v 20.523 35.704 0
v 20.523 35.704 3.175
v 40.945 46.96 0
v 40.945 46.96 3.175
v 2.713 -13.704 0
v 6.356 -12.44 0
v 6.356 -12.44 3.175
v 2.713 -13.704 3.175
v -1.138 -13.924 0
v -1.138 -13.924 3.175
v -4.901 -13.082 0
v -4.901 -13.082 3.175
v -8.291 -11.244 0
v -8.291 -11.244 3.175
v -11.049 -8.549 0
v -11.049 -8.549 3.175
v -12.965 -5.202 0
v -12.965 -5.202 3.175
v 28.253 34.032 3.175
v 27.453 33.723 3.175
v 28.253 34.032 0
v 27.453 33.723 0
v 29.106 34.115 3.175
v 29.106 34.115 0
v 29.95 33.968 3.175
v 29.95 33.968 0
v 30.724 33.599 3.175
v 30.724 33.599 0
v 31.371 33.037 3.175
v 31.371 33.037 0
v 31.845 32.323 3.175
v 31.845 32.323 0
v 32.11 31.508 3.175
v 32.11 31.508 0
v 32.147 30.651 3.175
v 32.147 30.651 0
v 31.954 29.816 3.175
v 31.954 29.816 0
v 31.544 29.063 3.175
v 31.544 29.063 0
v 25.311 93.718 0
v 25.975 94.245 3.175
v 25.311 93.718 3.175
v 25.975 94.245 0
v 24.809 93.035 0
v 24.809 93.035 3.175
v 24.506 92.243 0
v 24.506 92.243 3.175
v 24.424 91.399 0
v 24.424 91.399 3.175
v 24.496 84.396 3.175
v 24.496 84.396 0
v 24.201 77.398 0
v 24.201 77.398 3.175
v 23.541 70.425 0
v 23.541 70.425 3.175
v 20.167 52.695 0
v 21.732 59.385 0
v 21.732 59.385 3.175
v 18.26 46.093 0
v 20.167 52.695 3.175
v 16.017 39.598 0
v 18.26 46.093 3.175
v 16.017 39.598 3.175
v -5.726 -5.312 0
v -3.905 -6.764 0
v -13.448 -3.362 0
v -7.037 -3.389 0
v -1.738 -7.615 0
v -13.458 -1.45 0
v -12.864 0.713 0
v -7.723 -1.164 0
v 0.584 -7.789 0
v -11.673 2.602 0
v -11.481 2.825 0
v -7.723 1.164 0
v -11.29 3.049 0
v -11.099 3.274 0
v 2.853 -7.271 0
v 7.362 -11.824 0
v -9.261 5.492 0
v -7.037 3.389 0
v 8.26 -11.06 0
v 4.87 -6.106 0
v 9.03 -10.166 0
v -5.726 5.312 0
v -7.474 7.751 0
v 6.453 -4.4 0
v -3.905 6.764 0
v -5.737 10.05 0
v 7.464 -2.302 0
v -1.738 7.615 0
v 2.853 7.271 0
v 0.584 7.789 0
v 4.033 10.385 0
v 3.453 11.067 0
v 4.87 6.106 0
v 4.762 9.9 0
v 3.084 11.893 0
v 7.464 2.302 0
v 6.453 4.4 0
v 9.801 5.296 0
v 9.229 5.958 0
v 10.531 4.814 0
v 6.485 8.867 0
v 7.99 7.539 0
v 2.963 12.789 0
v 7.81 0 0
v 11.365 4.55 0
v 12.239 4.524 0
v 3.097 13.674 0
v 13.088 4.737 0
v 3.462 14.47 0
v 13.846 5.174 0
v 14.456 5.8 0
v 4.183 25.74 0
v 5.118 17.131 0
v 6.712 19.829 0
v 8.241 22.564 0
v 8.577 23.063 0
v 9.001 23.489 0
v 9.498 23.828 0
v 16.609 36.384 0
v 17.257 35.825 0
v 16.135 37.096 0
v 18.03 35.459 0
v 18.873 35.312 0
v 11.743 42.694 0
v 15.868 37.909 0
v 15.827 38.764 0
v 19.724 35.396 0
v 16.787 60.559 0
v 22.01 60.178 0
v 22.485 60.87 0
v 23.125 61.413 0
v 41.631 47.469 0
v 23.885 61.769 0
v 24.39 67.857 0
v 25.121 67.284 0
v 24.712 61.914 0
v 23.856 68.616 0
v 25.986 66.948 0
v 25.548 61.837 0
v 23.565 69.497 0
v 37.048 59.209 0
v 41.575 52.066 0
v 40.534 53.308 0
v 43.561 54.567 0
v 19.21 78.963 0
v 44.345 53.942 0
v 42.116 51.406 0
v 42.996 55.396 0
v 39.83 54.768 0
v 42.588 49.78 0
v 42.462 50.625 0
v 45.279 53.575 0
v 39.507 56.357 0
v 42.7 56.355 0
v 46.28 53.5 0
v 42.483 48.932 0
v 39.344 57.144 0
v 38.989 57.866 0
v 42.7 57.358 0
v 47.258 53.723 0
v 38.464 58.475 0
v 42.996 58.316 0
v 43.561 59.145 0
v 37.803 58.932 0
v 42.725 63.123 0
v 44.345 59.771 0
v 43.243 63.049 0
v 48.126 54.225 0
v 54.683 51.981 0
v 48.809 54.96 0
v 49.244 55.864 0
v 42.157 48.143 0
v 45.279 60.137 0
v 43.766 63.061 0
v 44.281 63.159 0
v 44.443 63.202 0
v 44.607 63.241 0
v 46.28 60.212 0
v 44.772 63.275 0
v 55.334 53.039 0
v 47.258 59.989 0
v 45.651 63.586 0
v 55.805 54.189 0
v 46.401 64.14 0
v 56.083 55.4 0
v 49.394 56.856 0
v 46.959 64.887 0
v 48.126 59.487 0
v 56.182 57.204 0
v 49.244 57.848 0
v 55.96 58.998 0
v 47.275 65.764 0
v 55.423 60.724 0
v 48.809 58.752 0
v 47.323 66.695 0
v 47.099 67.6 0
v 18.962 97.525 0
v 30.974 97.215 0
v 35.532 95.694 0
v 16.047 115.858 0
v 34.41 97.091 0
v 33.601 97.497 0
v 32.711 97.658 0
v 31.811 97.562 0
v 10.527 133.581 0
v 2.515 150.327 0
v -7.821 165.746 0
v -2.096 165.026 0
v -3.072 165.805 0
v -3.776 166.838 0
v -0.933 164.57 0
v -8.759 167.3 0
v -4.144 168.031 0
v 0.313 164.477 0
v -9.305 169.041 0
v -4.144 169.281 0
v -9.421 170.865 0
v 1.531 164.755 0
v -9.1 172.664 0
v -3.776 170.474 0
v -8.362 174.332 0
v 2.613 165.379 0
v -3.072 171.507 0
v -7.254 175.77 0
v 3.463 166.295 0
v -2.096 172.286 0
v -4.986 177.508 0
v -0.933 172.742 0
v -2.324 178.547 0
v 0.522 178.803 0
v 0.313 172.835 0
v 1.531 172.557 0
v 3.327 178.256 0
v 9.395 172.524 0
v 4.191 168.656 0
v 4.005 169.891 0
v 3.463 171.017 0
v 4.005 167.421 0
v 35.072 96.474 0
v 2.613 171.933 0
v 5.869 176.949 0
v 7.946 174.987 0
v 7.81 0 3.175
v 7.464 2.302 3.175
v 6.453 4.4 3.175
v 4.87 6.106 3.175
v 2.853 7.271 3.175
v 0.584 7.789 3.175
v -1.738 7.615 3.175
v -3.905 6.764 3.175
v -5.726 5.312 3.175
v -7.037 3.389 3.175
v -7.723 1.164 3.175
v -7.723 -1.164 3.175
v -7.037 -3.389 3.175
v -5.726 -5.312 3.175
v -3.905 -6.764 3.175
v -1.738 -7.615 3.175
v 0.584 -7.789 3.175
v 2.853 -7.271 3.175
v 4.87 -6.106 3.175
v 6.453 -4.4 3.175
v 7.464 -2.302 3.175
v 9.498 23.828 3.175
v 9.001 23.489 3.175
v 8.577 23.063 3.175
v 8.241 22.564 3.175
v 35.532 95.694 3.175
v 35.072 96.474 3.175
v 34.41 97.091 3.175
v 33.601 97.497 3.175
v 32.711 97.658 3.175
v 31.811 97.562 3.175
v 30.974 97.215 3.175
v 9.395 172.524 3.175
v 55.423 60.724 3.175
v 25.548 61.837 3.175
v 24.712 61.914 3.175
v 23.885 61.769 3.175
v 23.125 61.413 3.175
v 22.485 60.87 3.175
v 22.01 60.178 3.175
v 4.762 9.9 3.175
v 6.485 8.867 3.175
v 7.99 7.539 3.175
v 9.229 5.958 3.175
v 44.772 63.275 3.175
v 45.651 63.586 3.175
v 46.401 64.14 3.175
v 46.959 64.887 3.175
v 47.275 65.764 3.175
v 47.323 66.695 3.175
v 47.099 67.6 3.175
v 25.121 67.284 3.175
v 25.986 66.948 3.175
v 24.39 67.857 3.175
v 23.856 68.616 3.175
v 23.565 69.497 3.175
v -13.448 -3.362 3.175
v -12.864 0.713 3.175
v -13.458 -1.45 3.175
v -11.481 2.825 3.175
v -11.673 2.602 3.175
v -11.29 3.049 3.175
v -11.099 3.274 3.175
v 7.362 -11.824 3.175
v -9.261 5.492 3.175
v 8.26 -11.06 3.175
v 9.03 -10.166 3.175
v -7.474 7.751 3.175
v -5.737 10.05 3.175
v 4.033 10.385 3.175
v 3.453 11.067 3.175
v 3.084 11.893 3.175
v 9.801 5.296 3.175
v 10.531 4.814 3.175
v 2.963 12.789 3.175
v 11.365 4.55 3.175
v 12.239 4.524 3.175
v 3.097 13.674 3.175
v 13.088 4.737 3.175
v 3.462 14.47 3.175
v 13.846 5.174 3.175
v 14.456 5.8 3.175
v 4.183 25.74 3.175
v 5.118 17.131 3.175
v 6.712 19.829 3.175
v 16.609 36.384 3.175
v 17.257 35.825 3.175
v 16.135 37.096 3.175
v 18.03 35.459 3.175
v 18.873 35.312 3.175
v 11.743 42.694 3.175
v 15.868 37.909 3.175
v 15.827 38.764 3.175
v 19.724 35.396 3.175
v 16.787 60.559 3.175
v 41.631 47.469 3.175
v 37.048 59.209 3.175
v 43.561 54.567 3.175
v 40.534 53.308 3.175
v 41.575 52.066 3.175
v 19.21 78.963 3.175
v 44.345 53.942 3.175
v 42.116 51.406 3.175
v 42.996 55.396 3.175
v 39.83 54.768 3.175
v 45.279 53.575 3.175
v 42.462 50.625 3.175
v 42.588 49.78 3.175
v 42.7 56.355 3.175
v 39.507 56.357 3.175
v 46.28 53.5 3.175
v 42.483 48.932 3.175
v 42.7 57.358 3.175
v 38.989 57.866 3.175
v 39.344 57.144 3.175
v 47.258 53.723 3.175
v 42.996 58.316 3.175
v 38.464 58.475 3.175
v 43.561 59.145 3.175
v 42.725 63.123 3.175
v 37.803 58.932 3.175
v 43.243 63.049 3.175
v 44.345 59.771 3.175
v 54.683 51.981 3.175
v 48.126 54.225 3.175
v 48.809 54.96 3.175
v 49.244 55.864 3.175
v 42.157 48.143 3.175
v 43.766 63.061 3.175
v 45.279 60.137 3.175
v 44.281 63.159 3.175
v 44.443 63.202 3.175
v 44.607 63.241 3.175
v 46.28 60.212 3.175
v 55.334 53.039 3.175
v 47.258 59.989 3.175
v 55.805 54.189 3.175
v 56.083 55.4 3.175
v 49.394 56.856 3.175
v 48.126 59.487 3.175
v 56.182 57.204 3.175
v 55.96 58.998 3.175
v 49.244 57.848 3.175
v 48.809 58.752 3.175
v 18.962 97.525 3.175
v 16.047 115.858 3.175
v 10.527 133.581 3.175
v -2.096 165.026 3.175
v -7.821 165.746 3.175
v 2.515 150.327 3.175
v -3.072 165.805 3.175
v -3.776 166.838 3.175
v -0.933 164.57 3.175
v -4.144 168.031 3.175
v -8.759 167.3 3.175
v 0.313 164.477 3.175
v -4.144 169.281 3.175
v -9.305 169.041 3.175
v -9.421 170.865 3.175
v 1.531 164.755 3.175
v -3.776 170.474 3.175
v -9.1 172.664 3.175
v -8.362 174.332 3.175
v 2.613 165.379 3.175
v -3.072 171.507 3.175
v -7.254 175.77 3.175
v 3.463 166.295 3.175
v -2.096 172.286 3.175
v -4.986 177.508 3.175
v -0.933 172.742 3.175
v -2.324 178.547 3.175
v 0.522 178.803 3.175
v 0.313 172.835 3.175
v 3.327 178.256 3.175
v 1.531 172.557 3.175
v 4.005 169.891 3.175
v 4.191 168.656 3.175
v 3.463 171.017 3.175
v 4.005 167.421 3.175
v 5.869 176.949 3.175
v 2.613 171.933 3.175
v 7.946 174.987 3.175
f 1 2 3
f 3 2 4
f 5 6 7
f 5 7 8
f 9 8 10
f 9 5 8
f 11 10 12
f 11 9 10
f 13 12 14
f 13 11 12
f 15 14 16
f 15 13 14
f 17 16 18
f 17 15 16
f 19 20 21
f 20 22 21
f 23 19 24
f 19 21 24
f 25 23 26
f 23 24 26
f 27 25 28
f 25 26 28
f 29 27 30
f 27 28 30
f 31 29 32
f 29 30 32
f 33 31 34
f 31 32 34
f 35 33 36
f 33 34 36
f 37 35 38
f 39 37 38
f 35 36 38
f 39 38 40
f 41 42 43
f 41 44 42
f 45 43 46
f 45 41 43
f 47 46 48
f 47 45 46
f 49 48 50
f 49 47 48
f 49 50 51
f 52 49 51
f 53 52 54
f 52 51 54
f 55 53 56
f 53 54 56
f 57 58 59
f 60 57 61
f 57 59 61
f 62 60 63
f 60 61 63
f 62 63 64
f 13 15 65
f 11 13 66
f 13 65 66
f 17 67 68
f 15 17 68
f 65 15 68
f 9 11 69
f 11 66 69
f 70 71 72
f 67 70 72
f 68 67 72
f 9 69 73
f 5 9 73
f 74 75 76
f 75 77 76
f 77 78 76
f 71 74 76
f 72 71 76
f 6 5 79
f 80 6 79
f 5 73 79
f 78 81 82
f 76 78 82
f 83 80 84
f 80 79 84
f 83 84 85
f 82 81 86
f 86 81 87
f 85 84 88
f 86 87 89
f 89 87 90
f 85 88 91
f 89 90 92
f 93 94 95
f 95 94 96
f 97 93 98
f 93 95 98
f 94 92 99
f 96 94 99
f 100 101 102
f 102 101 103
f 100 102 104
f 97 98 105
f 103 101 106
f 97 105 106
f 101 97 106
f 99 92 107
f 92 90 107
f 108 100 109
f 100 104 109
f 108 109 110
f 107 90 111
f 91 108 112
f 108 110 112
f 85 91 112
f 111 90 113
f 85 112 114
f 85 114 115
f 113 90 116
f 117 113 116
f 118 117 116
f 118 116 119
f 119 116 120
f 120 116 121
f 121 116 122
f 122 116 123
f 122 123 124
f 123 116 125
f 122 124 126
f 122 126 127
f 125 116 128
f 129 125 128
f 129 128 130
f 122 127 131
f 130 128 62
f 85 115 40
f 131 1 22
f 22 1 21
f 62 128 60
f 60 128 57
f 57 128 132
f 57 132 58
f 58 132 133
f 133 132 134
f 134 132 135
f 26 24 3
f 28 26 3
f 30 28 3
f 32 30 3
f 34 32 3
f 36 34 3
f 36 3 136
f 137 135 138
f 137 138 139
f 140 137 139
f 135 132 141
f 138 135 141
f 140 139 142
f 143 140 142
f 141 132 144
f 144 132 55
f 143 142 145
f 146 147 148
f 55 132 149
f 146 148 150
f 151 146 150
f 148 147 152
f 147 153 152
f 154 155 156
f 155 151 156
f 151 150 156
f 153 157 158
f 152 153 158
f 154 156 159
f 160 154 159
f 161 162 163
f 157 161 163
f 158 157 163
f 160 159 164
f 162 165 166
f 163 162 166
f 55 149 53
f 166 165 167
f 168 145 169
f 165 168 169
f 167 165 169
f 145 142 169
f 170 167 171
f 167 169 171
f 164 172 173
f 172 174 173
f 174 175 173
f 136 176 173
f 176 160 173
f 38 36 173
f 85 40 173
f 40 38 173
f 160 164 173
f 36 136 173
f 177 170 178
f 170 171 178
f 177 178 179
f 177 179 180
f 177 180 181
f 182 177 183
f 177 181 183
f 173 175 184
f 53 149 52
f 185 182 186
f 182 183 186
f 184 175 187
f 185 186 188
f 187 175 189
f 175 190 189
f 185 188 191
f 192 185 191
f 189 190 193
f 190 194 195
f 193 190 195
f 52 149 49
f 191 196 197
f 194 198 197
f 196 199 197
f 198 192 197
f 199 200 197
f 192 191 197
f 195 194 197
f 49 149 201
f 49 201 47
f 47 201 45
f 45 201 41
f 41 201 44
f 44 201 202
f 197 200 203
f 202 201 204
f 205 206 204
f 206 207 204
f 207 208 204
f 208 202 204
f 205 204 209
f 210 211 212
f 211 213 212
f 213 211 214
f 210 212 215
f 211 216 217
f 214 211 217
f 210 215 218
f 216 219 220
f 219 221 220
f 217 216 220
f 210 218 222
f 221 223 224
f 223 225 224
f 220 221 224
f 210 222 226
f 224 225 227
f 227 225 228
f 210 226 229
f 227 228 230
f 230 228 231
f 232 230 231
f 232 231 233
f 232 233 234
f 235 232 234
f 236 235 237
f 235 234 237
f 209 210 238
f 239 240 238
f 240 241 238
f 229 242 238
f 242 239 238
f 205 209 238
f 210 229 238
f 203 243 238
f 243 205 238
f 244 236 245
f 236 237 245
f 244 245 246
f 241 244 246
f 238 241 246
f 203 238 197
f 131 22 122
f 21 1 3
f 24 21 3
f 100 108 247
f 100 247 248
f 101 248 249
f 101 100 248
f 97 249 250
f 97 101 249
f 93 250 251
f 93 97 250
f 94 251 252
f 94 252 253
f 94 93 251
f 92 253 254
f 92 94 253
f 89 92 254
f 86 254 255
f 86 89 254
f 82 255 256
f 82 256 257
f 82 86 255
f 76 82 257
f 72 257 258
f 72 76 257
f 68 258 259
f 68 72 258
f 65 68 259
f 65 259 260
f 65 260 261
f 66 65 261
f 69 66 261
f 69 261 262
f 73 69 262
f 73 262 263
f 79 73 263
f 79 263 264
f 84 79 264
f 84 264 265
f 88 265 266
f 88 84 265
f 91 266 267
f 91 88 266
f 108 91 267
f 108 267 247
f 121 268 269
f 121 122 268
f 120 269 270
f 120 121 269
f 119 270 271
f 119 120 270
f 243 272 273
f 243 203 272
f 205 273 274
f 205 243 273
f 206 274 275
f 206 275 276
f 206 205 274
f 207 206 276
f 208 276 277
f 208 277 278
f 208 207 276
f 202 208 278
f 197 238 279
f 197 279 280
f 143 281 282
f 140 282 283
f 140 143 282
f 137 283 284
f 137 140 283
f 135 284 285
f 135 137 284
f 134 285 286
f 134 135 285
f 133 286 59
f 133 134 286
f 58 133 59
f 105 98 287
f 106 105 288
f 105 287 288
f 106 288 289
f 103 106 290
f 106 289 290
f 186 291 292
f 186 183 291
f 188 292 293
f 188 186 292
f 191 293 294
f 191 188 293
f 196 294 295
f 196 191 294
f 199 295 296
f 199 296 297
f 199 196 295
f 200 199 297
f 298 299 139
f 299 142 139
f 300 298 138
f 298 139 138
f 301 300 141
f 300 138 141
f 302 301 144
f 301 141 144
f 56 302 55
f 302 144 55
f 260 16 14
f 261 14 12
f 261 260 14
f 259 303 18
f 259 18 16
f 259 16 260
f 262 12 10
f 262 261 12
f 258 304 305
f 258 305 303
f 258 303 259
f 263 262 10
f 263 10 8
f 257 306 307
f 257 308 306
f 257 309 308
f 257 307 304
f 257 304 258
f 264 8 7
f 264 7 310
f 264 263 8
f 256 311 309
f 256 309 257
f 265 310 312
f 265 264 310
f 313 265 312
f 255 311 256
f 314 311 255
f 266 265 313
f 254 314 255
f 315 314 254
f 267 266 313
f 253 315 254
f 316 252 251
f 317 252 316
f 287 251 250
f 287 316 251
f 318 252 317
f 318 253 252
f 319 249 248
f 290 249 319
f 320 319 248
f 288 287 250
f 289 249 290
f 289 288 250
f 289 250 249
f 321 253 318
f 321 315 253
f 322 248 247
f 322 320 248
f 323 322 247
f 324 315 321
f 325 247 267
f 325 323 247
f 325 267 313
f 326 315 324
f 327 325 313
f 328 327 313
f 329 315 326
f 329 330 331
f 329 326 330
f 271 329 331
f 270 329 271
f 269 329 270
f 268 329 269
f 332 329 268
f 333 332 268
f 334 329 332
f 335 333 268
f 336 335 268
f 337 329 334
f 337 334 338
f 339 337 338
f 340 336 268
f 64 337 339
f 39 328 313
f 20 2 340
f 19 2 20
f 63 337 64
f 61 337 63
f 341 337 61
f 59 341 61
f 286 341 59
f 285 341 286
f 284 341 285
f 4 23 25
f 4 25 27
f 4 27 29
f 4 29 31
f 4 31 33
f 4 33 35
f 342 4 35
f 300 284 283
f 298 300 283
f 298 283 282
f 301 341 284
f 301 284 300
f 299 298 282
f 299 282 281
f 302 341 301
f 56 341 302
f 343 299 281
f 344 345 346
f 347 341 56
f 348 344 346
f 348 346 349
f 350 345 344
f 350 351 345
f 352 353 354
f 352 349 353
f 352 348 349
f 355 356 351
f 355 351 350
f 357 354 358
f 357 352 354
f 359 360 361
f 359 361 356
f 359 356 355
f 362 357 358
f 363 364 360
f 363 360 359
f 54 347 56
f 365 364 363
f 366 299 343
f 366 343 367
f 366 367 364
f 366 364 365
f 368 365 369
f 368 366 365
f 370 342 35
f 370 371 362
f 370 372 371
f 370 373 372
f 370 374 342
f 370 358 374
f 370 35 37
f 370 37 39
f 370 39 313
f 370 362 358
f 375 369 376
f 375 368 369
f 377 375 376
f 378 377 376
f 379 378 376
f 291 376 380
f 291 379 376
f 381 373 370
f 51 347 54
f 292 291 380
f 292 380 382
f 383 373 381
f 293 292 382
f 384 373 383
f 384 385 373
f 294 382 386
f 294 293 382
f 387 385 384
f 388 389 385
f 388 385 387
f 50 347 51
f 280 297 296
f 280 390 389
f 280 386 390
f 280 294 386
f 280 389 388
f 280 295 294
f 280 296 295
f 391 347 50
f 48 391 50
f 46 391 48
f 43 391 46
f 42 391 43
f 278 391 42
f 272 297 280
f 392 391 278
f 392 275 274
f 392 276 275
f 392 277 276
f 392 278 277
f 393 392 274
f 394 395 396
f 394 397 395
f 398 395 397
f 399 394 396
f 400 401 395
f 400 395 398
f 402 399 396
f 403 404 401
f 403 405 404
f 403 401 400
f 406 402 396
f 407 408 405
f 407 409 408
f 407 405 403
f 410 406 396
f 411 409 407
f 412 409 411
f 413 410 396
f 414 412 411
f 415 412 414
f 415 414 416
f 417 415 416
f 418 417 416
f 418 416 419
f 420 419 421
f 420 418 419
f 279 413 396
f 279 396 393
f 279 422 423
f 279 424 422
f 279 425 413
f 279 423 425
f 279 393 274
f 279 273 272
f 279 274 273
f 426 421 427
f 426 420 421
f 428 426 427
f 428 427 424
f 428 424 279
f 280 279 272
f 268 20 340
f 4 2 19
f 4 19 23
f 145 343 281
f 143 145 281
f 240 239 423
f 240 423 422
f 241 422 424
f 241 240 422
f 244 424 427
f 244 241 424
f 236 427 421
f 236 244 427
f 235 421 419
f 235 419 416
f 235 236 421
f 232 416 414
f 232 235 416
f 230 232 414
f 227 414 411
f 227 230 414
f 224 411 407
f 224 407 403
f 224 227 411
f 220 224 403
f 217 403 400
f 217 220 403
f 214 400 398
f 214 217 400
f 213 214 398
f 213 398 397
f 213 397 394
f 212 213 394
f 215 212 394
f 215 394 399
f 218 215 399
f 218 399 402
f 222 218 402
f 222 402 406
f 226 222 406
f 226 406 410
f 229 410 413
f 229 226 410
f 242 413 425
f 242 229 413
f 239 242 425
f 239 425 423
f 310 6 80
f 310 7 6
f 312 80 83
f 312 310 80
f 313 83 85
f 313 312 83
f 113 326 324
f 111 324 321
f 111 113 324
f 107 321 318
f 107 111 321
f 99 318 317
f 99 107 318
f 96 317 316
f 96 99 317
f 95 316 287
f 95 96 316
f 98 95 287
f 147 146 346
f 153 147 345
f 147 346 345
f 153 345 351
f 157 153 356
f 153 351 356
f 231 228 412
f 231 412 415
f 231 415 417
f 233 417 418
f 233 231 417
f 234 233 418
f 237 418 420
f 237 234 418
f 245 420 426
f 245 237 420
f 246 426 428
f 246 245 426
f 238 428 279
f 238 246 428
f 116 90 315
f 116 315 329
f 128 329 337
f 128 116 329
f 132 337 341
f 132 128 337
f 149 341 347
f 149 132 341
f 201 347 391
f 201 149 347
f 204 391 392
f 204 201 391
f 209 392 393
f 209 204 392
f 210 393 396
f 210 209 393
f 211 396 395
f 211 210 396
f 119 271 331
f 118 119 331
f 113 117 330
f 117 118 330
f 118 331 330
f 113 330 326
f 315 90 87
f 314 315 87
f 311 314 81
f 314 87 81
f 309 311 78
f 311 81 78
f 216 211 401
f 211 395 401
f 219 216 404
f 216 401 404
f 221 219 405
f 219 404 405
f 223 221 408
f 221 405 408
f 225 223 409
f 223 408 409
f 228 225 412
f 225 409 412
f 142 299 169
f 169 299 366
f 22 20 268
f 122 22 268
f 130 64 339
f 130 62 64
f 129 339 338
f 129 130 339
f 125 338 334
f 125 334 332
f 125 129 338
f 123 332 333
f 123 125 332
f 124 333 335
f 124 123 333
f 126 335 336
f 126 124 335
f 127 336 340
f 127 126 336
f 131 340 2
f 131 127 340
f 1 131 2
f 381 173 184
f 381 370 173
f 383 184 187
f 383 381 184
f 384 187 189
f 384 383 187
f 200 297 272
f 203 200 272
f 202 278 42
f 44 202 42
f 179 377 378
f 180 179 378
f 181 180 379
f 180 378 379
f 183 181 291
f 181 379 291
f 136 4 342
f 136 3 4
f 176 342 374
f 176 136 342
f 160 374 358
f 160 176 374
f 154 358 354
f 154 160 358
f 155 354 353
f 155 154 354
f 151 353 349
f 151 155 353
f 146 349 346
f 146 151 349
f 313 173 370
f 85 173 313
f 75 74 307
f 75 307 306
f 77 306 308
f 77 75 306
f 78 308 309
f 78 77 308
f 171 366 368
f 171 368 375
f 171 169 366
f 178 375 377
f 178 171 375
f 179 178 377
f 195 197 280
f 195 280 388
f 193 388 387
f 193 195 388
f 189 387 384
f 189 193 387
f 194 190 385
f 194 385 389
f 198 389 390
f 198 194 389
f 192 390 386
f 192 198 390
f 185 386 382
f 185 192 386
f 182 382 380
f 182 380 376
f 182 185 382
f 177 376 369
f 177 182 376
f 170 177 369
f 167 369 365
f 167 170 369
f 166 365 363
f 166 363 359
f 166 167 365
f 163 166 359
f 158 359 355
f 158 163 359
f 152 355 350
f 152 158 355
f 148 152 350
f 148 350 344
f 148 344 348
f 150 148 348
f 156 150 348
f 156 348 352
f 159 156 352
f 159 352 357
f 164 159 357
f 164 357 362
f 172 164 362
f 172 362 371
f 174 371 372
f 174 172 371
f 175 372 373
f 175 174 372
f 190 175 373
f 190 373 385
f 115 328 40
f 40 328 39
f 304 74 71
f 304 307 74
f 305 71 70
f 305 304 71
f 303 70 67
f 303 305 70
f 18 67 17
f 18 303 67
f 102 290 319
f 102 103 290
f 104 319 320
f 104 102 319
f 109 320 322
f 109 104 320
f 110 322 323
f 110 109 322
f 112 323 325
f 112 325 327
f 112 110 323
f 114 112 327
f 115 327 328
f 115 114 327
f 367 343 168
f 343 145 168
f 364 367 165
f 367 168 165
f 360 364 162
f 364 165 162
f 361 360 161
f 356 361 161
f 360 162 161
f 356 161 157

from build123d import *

# Parameters (mm, degrees)
SKETCH1_R           = 3.3655
SKETCH1_R_2         = 4.191
SKETCH1_R_3         = 7.8105
BOSS_EXTRUDE1_DEPTH = 3.175
CUT_EXTRUDE1_DEPTH  = 6.35
FILLET5_R           = 7.62
FILLET6_R           = 3.175


with BuildPart() as part:
    # Sketch1 → Boss-Extrude1 (new body)
    with BuildSketch(Plane.XY):
        with BuildLine():
            ThreePointArc((-13.97, 0), (-6.360706327, -12.437938536), (8.177790267, -11.326281223))
            Line((8.177790267, -11.326281223), (55.423036695, 52.988309562))
            ThreePointArc((55.423036695, 52.988309562), (56.188096936, 56.856216867), (55.423036695, 60.724124173))
            Line((55.423036695, 60.724124173), (9.394939759, 172.523907306))
            ThreePointArc((9.394939759, 172.523907306), (-1.971422335, 178.622899918), (-10.16, 168.656))
            ThreePointArc((-10.16, 168.656), (19.399795867, 83.617198889), (-13.97, 0))
        make_face()
        with Locations((46.028096936, 56.856216867)):
            Circle(SKETCH1_R, mode=Mode.SUBTRACT)
        with Locations((0, 168.656)):
            Circle(SKETCH1_R_2, mode=Mode.SUBTRACT)
        Circle(SKETCH1_R_3, mode=Mode.SUBTRACT)
    extrude(amount=BOSS_EXTRUDE1_DEPTH)

    # Sketch2 → Cut-Extrude1 (cut)
    with BuildSketch(Plane.XY.offset(3.175)):
        with BuildLine():
            ThreePointArc((24.342369565, 93.274569778), (24.372628405, 80.404838249), (23.166725616, 67.591692511))
            Line((23.166725616, 67.591692511), (43.590488936, 62.925500803))
            ThreePointArc((43.590488936, 62.925500803), (46.410316451, 63.385539075), (49.157207608, 62.599631066))
            Line((49.157207608, 62.599631066), (34.133316244, 99.091858815))
            Line((34.133316244, 99.091858815), (24.342369565, 93.274569778))
        make_face()
        with BuildLine():
            Line((39.723792881, 58.598023584), (22.350976776, 62.56716919))
            ThreePointArc((22.350976776, 62.56716919), (18.436727595, 46.655838158), (12.607589722, 31.342022385))
            Line((12.607589722, 31.342022385), (47.239535948, 50.428888047))
            ThreePointArc((47.239535948, 50.428888047), (41.214780777, 52.427884471), (39.723792881, 58.598023584))
        make_face()
        with BuildLine():
            Line((40.079895195, 40.682524127), (8.679618073, 23.376743294))
            ThreePointArc((8.679618073, 23.376743294), (5.069193292, 17.049607217), (1.119884547, 10.928269252))
            ThreePointArc((1.119884547, 10.928269252), (7.805850235, 7.729806748), (10.938708503, 1.012850693))
            Line((10.938708503, 1.012850693), (40.079895195, 40.682524127))
        make_face()
    extrude(amount=-CUT_EXTRUDE1_DEPTH, mode=Mode.SUBTRACT)

    # Fillet5
    fillet5_edges = [part.edges().sort_by_distance(p)[0] for p in [
        (-13.97, 0, 1.5875),
        (-10.16, 168.656, 1.5875),
        (55.423036695, 52.988309562, 1.5875),
        (8.177790267, -11.326281223, 1.5875),
    ]]
    fillet(fillet5_edges, radius=FILLET5_R)

    # Fillet6
    fillet6_edges = [part.edges().sort_by_distance(p)[0] for p in [
        (10.938708503, 1.012850693, 1.5875),
        (1.119884547, 10.928269252, 1.5875),
        (8.679618073, 23.376743294, 1.5875),
        (40.079895195, 40.682524127, 1.5875),
        (47.239535948, 50.428888047, 1.5875),
        (12.607589722, 31.342022385, 1.5875),
        (22.350976776, 62.56716919, 1.5875),
        (39.723792881, 58.598023584, 1.5875),
        (49.157207608, 62.599631066, 1.5875),
        (43.590488936, 62.925500803, 1.5875),
        (23.166725616, 67.591692511, 1.5875),
        (24.342369565, 93.274569778, 1.5875),
        (34.133316244, 99.091858815, 1.5875),
    ]]
    fillet(fillet6_edges, radius=FILLET6_R)


solid = part.part
